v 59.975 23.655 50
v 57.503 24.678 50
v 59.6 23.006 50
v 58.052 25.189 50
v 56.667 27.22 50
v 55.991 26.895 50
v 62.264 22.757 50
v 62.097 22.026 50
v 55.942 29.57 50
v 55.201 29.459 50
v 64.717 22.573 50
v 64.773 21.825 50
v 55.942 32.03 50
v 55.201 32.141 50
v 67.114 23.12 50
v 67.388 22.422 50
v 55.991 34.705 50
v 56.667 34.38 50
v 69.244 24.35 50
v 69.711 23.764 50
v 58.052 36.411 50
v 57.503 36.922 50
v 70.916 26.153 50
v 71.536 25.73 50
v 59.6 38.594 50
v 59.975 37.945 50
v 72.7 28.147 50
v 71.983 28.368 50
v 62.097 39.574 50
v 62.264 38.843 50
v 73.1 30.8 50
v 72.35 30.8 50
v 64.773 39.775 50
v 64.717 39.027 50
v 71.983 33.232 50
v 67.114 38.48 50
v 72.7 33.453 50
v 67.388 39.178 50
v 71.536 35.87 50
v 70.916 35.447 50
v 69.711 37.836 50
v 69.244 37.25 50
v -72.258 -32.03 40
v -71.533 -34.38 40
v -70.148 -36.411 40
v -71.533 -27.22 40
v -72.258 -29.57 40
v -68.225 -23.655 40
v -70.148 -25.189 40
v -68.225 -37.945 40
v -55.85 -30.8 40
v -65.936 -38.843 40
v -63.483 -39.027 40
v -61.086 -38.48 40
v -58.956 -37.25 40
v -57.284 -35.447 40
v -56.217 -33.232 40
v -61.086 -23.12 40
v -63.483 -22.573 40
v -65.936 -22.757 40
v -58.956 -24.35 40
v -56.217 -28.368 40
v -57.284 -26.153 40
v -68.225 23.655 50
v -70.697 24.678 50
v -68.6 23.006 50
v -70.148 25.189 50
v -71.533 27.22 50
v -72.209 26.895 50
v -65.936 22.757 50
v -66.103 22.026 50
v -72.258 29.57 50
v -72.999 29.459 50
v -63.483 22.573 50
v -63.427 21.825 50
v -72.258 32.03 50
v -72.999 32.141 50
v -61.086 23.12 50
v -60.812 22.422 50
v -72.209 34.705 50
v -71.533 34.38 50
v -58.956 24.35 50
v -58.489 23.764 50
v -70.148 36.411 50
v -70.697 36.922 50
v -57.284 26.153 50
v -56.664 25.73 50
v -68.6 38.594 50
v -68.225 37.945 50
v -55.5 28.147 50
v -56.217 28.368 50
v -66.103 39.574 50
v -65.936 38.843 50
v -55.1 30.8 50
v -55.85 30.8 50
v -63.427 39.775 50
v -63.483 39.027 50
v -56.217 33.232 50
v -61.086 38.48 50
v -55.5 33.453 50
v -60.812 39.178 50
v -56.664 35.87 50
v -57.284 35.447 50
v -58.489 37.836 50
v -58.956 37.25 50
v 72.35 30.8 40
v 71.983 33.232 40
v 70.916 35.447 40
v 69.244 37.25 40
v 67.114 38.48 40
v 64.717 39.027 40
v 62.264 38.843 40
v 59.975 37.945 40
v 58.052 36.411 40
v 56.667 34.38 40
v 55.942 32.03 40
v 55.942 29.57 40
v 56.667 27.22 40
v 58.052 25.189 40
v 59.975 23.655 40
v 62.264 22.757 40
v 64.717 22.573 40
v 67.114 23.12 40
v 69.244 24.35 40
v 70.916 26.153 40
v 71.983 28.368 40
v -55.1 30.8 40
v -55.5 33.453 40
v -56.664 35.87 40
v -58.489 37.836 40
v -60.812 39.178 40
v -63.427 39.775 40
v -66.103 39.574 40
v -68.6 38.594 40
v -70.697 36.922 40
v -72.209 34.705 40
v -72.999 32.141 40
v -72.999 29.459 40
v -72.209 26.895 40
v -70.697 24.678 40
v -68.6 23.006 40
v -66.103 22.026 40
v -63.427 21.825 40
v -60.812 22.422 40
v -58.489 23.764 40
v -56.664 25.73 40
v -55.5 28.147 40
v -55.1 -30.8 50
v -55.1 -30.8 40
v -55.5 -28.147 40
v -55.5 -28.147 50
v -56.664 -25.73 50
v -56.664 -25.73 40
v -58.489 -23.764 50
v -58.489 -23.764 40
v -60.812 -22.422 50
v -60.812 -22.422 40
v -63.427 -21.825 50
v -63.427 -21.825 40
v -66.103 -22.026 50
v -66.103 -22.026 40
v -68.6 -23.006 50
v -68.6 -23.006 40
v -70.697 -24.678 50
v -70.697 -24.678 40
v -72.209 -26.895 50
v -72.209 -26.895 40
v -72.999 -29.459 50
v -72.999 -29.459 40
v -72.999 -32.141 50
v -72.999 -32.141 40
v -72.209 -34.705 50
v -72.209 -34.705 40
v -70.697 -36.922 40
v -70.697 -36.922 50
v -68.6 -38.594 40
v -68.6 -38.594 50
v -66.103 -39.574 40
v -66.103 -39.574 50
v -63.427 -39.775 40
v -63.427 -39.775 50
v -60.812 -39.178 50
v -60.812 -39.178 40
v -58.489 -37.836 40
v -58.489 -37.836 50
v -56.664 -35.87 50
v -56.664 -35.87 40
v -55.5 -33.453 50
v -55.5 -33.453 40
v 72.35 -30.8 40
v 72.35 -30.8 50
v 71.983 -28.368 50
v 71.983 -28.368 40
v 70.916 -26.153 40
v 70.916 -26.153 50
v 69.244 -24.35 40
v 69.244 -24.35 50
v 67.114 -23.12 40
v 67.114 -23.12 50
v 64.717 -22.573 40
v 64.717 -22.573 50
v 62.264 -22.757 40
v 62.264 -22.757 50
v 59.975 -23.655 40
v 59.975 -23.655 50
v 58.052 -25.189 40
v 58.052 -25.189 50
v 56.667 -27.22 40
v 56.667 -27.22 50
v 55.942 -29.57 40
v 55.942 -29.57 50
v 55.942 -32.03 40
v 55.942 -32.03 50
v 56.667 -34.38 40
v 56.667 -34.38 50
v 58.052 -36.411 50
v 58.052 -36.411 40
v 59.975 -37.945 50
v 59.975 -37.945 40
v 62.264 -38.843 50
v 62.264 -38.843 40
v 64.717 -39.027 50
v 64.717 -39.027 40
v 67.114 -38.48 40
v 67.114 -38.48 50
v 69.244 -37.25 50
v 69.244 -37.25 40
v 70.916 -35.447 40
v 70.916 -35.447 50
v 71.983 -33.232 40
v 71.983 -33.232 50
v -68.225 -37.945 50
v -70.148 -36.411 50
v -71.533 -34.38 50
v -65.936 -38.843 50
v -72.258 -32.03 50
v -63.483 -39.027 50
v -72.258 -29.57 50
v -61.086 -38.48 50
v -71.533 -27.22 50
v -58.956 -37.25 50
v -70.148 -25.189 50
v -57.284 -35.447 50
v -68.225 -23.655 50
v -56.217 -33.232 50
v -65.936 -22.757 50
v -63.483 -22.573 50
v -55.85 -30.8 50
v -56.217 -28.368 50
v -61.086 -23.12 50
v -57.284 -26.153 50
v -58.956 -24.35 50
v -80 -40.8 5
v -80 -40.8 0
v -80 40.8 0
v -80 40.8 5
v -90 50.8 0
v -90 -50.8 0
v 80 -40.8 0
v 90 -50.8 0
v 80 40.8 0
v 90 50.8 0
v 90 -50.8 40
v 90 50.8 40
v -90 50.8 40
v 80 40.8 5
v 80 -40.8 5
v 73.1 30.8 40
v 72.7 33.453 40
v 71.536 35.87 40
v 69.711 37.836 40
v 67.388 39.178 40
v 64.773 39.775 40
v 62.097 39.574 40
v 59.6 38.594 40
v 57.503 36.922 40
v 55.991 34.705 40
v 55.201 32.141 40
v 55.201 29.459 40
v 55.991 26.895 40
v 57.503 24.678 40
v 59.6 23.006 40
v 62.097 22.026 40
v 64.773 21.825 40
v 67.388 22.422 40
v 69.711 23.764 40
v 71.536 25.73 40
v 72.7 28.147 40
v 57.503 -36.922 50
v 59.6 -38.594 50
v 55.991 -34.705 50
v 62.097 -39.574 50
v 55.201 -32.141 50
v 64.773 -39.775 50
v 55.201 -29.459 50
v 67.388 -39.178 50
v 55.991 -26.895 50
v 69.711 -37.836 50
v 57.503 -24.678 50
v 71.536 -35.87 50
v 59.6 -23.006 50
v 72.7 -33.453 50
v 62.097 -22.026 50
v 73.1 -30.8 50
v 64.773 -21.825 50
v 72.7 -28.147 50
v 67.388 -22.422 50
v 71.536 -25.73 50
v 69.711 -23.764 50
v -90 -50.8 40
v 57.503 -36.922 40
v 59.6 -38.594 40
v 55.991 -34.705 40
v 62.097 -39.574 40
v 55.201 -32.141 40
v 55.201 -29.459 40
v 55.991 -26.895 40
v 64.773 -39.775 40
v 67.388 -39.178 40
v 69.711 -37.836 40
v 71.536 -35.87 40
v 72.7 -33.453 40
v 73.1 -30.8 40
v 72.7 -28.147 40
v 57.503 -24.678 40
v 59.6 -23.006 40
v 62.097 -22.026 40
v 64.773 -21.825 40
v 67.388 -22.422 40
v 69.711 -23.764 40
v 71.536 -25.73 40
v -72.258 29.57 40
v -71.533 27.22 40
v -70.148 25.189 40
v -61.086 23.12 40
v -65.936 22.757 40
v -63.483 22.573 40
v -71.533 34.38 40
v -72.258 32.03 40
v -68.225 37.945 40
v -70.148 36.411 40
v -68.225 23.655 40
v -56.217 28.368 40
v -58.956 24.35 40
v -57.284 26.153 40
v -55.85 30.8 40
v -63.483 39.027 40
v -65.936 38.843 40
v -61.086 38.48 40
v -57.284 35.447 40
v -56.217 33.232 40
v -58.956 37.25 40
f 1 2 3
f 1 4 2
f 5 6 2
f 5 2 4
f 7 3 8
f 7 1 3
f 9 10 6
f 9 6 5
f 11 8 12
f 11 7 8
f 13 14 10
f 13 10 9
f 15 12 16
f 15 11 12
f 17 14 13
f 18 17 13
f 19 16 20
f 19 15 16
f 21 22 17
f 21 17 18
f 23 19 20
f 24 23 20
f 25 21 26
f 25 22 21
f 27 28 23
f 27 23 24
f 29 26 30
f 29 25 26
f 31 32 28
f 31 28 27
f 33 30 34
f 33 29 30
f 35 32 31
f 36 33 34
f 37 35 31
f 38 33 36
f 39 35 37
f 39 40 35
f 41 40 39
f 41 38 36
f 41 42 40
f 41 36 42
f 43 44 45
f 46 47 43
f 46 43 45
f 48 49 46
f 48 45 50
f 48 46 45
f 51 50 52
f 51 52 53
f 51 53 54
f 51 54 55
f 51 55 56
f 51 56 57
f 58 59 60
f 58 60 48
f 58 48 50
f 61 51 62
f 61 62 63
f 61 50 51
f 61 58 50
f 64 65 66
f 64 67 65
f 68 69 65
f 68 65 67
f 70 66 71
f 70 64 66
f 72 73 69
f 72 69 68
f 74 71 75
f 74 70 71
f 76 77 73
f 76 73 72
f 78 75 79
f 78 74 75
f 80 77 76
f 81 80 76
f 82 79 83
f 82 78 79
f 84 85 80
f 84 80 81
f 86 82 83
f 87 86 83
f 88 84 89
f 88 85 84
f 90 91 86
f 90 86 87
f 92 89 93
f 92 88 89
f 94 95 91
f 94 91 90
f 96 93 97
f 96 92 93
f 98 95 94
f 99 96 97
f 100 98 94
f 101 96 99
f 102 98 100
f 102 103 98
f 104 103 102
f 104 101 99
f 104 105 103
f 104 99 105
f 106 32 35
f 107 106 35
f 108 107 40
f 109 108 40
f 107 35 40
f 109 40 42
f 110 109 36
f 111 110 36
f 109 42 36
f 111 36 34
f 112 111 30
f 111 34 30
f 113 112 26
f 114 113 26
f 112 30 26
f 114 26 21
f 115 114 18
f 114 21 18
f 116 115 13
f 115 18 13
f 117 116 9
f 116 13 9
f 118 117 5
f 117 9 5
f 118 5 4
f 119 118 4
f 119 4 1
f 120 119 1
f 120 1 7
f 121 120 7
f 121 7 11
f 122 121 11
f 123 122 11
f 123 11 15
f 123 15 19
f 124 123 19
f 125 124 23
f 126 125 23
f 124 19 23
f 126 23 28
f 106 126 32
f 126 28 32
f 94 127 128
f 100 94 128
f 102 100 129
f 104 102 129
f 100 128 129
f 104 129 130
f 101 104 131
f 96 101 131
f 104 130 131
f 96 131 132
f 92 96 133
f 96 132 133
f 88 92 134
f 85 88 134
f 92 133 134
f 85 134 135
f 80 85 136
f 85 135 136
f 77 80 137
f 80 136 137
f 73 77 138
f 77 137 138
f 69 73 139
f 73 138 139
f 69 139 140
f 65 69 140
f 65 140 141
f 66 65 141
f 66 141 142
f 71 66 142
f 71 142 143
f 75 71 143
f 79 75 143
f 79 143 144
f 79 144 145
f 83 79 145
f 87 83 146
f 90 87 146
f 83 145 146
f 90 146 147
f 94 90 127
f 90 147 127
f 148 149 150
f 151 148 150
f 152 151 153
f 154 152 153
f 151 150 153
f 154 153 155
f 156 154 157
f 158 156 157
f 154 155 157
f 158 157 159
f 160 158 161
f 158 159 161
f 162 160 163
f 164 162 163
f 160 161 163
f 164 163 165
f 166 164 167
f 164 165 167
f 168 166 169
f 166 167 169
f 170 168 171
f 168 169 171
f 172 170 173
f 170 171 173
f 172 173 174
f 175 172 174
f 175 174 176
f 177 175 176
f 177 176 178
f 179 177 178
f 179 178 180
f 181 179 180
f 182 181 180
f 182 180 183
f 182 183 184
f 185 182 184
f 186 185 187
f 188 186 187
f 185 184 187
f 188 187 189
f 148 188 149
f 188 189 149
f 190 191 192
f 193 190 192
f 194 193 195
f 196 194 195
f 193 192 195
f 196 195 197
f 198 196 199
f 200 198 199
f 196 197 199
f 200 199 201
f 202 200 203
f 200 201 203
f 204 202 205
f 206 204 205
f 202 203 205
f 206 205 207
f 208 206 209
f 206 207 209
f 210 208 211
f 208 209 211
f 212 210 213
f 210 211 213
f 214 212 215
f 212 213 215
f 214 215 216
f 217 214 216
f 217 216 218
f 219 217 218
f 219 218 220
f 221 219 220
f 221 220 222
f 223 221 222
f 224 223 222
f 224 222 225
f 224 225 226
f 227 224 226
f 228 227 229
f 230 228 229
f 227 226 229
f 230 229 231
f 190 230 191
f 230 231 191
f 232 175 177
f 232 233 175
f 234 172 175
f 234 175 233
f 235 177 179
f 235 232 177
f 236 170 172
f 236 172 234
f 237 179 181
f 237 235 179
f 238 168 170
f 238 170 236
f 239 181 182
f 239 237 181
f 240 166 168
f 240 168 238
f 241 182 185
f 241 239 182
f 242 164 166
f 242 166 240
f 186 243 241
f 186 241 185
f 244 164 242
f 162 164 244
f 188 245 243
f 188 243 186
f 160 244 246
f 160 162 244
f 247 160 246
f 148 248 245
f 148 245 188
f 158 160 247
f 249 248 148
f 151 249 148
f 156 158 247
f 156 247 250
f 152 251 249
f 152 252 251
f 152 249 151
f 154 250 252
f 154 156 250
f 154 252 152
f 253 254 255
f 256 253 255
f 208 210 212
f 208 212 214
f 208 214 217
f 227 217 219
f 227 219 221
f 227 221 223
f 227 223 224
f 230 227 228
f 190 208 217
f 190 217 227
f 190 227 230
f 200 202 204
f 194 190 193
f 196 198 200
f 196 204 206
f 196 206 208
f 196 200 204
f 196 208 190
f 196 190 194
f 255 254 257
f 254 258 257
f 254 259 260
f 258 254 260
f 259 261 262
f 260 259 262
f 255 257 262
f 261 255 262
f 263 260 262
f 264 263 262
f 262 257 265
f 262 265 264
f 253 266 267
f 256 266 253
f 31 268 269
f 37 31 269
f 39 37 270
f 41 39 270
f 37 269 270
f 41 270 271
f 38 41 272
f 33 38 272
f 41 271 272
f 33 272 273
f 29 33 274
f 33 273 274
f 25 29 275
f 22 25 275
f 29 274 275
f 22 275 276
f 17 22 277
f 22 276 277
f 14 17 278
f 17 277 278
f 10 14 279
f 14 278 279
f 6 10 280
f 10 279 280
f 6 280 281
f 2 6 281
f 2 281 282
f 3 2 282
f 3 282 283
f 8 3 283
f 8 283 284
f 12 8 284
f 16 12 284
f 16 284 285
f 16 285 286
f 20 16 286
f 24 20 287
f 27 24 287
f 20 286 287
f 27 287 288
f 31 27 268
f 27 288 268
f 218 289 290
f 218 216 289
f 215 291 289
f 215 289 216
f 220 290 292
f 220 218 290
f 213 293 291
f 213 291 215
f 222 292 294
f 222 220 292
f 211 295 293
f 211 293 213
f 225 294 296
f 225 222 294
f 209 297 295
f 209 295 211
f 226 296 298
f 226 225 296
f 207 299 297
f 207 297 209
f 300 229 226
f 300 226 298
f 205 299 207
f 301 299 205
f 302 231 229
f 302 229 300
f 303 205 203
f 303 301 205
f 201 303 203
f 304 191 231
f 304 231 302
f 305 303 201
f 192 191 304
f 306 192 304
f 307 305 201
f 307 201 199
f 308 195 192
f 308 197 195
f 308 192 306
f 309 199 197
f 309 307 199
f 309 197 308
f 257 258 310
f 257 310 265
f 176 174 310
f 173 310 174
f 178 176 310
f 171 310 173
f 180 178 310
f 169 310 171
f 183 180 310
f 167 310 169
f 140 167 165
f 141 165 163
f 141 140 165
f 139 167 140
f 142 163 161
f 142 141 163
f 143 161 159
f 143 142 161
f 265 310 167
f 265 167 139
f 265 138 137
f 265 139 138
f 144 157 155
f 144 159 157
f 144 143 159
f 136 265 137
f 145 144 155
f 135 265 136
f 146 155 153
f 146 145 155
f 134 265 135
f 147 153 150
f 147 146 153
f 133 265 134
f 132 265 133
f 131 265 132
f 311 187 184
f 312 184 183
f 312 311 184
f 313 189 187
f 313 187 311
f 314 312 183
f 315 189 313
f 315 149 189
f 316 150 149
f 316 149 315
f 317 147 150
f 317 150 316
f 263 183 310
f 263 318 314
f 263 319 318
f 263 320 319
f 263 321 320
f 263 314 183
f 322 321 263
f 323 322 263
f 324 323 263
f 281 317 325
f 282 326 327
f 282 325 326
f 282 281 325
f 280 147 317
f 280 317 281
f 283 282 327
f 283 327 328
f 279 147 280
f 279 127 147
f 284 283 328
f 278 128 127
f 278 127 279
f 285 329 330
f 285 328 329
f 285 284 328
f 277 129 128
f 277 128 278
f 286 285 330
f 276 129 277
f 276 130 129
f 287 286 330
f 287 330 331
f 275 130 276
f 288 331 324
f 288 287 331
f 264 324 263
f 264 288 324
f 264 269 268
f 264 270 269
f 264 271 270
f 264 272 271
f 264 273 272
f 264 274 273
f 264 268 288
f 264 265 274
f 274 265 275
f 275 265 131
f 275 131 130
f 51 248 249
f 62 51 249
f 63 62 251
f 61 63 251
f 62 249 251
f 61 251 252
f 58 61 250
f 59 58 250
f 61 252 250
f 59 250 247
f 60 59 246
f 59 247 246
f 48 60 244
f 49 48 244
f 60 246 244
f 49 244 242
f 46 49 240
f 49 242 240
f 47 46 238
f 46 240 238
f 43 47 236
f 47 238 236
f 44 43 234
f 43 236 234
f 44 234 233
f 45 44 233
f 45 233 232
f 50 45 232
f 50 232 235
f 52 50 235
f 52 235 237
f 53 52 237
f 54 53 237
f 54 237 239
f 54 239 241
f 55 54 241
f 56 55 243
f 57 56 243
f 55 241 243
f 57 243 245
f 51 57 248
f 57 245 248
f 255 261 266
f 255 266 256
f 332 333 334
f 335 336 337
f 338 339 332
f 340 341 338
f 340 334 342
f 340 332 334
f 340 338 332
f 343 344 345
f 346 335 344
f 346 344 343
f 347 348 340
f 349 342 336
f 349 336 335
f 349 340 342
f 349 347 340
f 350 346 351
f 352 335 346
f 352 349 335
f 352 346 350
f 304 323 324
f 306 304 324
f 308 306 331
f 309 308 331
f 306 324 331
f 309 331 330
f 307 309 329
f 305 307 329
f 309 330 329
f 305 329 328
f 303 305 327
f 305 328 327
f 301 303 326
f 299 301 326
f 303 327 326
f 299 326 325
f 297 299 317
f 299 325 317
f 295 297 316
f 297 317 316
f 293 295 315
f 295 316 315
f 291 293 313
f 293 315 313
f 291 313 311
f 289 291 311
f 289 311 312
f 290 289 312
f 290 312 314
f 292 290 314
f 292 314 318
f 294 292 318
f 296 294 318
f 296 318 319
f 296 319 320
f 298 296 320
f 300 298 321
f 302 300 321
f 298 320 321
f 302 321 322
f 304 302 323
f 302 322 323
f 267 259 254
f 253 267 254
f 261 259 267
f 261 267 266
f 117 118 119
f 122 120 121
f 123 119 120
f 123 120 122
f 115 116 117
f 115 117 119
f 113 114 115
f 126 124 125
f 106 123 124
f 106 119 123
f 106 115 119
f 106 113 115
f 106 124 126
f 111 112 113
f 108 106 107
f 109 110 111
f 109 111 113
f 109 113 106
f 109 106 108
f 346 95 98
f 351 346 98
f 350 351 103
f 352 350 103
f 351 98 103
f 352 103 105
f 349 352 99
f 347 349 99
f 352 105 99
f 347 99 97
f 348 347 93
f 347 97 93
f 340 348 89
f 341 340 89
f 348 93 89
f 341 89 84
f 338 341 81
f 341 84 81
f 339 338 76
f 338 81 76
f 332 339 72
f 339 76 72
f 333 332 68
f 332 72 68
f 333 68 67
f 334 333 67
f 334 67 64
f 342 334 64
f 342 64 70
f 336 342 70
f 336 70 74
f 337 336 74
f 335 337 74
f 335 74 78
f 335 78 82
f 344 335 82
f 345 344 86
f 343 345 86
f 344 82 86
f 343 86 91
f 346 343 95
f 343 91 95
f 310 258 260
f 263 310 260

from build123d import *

# Parameters (mm, degrees)
SKETCH1_W           = 180
SKETCH1_H           = 101.6
BOSS_EXTRUDE1_DEPTH = 40
SKETCH3_W           = 160
SKETCH3_H           = 81.6
CUT_EXTRUDE3_DEPTH  = 5
SKETCH4_R           = 9
BOSS_EXTRUDE2_DEPTH = 10
SKETCH5_R           = 8.25
CUT_EXTRUDE4_DEPTH  = 10


with BuildPart() as part:
    # Sketch1 → Boss-Extrude1 (new body)
    with BuildSketch(Plane.XY):
        Rectangle(SKETCH1_W, SKETCH1_H)
    extrude(amount=BOSS_EXTRUDE1_DEPTH)

    # Sketch3 → Cut-Extrude3 (cut)
    with BuildSketch(Plane(origin=(0, 0, 0), x_dir=(-1, 0, 0), z_dir=(0, 0, -1))):
        Rectangle(SKETCH3_W, SKETCH3_H)
    extrude(amount=-CUT_EXTRUDE3_DEPTH, mode=Mode.SUBTRACT)

    # Sketch4 → Boss-Extrude2 (add)
    with BuildSketch(Plane.XY.offset(40)):
        with Locations((-64.1, 30.8)):
            Circle(SKETCH4_R)
        with Locations((-64.1, -30.8)):
            Circle(SKETCH4_R)
        with Locations((64.1, 30.8)):
            Circle(SKETCH4_R)
        with Locations((64.1, -30.8)):
            Circle(SKETCH4_R)
    extrude(amount=BOSS_EXTRUDE2_DEPTH)

    # Sketch5 → Cut-Extrude4 (cut)
    with BuildSketch(Plane.XY.offset(50)):
        with Locations((-64.1, 30.8)):
            Circle(SKETCH5_R)
        with Locations((64.1, 30.8)):
            Circle(SKETCH5_R)
        with Locations((64.1, -30.8)):
            Circle(SKETCH5_R)
        with Locations((-64.1, -30.8)):
            Circle(SKETCH5_R)
    extrude(amount=-CUT_EXTRUDE4_DEPTH, mode=Mode.SUBTRACT)


solid = part.part
